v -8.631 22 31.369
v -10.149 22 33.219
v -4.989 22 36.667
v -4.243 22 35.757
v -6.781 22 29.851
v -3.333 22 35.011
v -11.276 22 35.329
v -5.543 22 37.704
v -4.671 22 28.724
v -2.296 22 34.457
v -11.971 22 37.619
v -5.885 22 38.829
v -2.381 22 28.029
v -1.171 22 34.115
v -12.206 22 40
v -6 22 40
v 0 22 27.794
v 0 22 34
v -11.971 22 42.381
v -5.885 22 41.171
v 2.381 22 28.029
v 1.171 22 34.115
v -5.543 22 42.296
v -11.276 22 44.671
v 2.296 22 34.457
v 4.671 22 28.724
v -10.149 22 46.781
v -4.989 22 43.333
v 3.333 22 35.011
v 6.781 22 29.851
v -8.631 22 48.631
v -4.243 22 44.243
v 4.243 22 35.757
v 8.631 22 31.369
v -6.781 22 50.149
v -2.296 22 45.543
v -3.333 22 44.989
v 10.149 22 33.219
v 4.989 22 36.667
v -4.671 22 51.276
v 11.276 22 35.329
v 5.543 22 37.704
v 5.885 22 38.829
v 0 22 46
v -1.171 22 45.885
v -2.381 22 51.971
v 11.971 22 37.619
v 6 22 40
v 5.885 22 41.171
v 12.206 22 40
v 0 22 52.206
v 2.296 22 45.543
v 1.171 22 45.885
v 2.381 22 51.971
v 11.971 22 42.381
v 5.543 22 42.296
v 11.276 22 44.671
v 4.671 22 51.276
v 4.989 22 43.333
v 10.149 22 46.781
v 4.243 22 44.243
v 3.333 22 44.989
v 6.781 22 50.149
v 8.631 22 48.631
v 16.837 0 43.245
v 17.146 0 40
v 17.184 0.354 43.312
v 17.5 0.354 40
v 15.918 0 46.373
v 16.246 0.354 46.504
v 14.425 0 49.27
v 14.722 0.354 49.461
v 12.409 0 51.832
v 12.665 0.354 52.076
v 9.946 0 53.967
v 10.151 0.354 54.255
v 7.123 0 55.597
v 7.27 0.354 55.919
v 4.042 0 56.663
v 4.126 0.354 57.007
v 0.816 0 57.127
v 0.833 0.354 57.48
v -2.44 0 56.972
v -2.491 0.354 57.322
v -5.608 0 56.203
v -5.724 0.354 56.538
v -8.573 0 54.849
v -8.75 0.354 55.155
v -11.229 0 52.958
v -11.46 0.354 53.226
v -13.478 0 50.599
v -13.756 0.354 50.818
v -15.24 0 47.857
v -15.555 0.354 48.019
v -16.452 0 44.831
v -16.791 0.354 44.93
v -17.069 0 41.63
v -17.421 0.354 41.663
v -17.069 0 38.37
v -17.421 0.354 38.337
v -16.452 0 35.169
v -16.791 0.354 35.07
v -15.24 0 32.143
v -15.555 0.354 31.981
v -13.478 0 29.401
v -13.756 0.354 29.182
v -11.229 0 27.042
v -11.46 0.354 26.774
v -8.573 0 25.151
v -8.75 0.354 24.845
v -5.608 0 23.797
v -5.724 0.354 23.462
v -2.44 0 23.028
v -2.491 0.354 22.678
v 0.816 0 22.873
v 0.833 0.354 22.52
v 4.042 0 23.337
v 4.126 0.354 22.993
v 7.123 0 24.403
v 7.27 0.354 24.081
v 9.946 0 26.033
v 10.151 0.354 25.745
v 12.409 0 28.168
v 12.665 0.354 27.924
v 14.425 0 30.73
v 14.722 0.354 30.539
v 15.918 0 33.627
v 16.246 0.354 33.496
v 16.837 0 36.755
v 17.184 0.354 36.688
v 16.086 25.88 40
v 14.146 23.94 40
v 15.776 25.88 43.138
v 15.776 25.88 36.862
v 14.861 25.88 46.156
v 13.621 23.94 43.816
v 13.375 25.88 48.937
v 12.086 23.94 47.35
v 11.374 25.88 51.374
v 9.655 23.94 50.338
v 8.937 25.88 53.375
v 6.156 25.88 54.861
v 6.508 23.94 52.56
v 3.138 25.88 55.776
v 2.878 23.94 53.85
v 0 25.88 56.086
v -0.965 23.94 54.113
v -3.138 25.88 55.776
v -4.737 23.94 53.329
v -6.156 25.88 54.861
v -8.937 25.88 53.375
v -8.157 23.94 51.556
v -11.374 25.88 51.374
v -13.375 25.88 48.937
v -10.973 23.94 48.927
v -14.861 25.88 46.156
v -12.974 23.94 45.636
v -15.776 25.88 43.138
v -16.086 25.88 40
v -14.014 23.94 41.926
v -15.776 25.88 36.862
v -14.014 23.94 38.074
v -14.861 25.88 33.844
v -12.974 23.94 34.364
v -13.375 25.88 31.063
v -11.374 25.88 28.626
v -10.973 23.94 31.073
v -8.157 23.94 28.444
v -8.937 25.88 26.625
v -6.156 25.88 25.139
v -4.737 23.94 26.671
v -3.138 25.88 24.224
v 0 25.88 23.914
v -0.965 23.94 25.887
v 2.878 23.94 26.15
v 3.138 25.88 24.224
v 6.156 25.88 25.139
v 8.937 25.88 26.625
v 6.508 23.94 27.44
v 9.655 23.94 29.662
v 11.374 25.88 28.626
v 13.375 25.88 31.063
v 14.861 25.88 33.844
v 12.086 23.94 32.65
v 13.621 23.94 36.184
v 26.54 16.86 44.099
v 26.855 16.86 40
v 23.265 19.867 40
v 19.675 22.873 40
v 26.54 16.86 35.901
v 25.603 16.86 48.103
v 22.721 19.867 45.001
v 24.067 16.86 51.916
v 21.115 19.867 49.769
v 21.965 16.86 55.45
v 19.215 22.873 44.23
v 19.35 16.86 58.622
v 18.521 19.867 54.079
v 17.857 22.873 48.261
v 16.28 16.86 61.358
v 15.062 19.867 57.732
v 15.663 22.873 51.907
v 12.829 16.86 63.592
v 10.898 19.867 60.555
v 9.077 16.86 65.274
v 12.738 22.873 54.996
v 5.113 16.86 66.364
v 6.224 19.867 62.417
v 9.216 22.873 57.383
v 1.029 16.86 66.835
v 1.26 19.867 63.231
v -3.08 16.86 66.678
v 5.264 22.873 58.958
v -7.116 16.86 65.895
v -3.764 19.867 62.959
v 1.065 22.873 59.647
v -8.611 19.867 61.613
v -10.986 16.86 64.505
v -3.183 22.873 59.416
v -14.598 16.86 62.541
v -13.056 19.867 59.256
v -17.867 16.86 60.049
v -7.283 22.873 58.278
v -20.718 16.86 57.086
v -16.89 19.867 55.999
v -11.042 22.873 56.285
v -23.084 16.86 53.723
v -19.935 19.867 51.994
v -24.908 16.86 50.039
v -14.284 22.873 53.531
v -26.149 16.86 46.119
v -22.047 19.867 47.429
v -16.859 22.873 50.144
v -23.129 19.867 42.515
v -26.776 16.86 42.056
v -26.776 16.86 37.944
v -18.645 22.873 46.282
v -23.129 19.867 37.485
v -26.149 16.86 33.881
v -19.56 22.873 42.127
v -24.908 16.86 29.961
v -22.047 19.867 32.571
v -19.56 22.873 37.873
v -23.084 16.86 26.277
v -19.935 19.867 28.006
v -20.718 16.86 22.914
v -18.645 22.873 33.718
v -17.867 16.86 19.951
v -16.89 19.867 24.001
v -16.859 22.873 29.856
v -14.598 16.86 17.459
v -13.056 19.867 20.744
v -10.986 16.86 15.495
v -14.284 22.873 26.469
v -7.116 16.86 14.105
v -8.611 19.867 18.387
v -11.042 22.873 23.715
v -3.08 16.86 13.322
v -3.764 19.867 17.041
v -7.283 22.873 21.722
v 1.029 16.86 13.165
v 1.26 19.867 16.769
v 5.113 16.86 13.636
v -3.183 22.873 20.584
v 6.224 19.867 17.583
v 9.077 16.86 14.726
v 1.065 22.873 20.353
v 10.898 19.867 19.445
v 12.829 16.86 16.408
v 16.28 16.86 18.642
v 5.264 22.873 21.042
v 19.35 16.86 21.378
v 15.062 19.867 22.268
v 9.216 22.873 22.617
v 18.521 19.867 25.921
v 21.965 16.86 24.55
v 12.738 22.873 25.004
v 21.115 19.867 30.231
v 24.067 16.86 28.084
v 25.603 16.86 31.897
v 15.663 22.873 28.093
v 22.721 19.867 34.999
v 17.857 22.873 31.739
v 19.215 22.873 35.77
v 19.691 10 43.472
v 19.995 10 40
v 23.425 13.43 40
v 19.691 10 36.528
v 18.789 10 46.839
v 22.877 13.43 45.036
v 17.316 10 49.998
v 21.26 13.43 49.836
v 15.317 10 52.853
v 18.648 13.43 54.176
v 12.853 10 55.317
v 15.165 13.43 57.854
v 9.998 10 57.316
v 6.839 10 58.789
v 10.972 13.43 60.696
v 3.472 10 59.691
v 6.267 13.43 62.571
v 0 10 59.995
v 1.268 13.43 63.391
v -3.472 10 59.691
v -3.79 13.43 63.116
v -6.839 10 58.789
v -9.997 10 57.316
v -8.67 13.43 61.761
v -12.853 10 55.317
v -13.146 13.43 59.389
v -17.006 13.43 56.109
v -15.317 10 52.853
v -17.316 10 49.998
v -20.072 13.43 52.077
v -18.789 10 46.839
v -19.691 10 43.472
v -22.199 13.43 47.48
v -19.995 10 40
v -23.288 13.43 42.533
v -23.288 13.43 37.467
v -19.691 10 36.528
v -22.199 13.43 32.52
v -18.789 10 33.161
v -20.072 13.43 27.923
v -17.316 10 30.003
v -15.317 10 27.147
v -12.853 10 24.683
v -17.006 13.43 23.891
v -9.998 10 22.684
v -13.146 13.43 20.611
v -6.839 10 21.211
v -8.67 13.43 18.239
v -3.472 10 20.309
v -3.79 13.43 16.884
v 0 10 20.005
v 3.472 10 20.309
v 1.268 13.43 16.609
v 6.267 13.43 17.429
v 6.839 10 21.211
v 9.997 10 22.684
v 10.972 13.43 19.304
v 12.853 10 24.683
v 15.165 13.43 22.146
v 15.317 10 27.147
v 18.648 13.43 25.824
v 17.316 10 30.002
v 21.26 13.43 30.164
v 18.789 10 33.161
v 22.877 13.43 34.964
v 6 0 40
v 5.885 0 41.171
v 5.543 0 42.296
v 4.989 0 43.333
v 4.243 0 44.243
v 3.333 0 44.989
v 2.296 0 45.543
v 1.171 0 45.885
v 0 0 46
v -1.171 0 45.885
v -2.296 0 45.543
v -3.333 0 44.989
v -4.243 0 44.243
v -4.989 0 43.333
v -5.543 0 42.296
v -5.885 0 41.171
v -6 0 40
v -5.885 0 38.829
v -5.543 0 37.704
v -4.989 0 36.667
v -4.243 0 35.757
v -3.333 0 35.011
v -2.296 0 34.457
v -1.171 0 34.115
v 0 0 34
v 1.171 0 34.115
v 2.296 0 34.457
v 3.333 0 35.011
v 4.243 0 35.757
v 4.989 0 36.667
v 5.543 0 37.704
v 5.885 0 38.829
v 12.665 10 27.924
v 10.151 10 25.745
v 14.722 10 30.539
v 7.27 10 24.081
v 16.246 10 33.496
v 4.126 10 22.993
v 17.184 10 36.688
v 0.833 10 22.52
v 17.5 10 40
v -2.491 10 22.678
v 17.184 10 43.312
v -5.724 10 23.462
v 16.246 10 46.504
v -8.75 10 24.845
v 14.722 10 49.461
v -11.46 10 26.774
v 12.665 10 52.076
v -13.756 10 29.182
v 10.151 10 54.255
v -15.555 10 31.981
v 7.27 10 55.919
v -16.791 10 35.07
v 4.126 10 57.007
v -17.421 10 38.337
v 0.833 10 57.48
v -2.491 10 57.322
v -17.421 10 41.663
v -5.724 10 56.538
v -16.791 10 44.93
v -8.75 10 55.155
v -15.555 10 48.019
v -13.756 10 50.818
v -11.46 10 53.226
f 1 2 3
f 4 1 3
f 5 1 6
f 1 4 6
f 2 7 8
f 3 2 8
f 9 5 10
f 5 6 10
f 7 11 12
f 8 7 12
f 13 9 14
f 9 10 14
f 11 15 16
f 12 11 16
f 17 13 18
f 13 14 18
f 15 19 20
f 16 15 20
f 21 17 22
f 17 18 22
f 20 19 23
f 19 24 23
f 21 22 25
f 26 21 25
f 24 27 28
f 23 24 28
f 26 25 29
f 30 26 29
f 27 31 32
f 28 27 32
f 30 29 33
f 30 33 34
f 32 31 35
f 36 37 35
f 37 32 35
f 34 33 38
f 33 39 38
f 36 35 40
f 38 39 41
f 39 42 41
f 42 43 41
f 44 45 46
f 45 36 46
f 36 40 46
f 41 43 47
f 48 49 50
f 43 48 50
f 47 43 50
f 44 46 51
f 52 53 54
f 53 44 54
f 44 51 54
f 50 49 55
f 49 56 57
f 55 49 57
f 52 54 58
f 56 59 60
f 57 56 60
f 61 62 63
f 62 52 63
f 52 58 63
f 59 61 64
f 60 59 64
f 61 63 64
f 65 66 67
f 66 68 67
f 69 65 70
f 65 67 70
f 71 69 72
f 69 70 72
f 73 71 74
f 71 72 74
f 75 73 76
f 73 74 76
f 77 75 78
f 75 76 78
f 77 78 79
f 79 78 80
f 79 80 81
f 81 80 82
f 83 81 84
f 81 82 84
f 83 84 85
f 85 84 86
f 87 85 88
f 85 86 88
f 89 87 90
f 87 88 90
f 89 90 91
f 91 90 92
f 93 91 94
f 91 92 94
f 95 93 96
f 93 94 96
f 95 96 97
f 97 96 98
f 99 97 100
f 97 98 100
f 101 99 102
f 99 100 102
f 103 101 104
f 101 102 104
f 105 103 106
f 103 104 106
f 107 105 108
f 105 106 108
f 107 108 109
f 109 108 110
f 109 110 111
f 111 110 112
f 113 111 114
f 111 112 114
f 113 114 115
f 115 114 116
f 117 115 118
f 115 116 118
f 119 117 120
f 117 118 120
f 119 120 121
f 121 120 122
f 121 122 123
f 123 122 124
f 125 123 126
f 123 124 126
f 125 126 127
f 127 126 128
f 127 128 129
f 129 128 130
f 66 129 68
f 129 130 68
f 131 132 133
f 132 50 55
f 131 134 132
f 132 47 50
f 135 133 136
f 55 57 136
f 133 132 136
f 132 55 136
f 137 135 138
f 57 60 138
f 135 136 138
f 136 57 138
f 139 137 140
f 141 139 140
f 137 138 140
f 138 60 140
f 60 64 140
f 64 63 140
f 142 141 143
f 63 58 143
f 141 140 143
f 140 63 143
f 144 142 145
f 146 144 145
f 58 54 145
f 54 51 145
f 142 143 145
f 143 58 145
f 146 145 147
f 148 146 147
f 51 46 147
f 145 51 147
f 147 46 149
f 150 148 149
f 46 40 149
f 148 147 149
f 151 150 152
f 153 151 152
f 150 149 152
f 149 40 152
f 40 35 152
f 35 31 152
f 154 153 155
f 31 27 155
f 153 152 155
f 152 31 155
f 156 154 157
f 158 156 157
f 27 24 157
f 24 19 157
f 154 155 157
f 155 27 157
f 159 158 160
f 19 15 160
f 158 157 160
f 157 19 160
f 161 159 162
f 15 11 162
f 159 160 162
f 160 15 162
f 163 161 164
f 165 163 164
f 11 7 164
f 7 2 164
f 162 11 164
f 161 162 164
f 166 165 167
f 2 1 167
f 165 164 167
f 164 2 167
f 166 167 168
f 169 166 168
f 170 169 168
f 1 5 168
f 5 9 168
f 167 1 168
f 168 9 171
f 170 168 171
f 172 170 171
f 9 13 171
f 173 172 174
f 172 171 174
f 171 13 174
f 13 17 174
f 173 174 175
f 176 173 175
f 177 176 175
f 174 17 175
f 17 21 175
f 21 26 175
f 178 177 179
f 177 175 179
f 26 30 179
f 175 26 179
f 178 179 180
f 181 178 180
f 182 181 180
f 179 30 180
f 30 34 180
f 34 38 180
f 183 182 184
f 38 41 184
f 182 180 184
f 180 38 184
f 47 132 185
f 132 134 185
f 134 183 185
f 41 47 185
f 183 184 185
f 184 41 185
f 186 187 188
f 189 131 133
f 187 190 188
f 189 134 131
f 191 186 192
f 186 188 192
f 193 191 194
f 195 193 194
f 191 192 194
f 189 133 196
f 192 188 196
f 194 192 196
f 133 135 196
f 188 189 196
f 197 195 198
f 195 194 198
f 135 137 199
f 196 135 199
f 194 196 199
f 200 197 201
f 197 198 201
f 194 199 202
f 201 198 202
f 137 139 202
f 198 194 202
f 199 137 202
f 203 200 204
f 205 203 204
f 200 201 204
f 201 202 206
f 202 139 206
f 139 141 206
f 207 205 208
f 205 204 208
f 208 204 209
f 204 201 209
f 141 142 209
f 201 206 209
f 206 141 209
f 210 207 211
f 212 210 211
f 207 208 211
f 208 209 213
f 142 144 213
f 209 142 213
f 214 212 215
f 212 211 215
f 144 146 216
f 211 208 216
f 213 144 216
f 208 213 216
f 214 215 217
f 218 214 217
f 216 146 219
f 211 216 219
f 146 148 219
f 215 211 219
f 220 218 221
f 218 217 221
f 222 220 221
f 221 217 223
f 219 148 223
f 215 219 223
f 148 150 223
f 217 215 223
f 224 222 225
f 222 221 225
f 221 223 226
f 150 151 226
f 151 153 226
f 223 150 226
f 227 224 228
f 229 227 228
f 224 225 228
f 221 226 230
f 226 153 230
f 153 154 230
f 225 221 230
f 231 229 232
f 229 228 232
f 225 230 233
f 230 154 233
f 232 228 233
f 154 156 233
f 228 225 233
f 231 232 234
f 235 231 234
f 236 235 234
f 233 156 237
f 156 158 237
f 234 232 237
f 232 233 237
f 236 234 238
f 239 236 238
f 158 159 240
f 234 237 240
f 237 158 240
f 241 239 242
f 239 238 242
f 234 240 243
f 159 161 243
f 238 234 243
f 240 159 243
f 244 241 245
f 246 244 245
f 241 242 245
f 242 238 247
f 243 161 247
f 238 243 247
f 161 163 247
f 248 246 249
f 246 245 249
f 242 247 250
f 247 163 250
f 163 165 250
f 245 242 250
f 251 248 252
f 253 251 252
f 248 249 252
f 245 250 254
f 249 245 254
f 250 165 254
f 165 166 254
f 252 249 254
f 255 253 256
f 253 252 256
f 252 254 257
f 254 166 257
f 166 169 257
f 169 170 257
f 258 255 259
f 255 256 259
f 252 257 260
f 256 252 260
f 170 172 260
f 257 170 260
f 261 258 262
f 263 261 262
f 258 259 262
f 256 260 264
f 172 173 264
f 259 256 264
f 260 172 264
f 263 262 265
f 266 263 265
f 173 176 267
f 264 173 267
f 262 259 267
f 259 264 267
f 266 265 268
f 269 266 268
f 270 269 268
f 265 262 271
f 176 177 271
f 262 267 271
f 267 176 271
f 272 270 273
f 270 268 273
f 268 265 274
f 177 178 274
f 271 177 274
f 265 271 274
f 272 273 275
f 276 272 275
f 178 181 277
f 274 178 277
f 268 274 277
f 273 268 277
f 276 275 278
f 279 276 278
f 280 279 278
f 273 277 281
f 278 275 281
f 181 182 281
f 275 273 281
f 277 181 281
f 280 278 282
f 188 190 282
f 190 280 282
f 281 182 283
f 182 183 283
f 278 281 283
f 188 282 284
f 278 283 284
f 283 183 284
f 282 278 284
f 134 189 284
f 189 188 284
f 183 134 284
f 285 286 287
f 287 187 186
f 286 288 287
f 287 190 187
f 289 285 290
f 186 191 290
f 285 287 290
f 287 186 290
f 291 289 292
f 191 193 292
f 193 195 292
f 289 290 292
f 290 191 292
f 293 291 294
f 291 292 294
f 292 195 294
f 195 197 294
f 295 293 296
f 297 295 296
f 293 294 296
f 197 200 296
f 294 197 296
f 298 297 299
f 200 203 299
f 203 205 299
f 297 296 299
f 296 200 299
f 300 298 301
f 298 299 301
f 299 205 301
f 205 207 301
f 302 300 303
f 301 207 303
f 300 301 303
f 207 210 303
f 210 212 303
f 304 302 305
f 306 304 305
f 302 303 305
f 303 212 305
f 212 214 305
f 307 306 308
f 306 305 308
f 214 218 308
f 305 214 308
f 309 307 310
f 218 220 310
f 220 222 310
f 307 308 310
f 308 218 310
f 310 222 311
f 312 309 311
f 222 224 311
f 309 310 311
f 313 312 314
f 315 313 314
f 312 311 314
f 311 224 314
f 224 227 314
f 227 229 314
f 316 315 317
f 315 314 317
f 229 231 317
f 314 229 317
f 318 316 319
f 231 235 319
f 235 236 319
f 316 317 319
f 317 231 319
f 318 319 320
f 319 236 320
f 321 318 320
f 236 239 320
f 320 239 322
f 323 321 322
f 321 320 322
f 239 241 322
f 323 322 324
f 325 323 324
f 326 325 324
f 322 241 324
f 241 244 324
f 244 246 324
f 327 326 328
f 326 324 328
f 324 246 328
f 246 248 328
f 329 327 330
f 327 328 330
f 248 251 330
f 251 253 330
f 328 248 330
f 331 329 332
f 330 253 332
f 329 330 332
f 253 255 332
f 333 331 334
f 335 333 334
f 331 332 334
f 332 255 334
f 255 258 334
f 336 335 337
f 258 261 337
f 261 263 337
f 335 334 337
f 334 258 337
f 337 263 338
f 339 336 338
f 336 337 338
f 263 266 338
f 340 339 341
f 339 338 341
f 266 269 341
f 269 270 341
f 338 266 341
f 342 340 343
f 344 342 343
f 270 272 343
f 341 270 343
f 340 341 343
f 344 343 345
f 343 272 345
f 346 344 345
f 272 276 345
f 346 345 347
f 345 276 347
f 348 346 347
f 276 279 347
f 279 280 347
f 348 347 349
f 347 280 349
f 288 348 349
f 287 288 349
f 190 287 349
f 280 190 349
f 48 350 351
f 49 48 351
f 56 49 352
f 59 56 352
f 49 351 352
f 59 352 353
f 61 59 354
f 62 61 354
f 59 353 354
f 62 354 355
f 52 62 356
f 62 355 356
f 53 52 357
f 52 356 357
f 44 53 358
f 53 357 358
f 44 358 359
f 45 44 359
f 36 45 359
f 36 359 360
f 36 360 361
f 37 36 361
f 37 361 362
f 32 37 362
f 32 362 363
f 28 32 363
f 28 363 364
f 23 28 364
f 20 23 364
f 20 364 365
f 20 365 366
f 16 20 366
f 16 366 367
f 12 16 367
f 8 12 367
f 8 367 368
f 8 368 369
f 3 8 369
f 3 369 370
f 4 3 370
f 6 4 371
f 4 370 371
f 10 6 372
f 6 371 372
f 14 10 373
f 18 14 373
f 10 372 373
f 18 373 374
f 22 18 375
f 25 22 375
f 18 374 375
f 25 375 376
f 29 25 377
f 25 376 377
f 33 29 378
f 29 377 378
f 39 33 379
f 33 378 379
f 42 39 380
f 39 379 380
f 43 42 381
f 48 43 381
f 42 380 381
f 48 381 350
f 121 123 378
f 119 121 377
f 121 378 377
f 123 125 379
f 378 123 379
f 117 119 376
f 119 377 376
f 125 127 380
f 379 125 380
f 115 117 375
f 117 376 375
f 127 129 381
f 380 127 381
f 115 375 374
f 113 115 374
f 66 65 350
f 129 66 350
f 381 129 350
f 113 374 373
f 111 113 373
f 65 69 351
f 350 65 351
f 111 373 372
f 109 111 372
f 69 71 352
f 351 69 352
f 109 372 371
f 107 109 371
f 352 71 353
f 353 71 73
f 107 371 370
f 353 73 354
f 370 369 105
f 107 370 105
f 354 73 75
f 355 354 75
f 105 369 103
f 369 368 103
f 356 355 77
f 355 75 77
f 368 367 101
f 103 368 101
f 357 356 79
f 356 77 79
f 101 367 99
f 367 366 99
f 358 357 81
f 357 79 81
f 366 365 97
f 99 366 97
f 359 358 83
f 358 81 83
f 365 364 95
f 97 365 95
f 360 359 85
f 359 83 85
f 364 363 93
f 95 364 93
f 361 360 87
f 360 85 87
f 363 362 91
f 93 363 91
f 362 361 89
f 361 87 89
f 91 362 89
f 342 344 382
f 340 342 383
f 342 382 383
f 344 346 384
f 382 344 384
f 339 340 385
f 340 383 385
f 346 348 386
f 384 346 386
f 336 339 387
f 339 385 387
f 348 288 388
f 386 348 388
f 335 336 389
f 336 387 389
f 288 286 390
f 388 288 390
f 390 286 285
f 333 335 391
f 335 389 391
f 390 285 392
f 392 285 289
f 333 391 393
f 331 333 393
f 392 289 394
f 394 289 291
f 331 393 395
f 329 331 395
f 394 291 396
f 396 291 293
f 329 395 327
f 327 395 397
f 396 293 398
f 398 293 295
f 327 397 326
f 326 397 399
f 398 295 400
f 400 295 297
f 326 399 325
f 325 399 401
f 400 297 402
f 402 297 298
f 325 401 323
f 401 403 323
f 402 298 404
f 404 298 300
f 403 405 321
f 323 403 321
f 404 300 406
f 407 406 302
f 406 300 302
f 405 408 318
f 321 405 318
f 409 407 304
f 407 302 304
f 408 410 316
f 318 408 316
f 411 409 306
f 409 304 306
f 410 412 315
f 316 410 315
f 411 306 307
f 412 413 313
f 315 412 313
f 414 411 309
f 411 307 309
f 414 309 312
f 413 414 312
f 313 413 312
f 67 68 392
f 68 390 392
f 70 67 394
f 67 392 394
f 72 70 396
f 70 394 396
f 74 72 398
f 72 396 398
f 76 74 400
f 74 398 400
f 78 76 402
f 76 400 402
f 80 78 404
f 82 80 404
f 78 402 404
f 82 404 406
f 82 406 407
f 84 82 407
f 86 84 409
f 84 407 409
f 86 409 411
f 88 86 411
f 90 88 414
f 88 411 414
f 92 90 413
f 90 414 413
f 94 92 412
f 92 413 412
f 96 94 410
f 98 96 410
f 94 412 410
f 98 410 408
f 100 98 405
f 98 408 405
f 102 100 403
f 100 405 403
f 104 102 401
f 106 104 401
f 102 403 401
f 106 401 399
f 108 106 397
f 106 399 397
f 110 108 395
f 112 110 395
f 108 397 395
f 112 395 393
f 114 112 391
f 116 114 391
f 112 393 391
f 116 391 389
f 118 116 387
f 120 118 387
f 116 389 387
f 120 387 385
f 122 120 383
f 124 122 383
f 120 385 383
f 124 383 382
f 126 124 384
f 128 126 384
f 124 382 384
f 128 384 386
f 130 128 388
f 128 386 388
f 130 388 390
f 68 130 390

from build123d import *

# Parameters (mm, degrees)
SKETCH2_R          = 6
CUT_EXTRUDE1_DEPTH = 26.88


with BuildPart() as part:
    # Sketch1 → Revolve1 (revolve)
    with BuildSketch(Plane.XY.offset(40)):
        Polygon((5.353553391, 0), (17.146446609, 0), (17.5, 0.353553391), (17.5, 10), (19.995, 10), (26.855, 16.86), (16.085548044, 25.88), (12.205548044, 22), (5, 22), (5, 0.353553391), align=None)
    revolve(axis=Axis((0, 25.88, 40), (0, -1, 0)))

    # Sketch2 → Cut-Extrude1 (cut, through all)
    with BuildSketch(Plane.XZ):
        with Locations((0, 40)):
            Circle(SKETCH2_R)
    extrude(amount=-CUT_EXTRUDE1_DEPTH, mode=Mode.SUBTRACT)


solid = part.part
